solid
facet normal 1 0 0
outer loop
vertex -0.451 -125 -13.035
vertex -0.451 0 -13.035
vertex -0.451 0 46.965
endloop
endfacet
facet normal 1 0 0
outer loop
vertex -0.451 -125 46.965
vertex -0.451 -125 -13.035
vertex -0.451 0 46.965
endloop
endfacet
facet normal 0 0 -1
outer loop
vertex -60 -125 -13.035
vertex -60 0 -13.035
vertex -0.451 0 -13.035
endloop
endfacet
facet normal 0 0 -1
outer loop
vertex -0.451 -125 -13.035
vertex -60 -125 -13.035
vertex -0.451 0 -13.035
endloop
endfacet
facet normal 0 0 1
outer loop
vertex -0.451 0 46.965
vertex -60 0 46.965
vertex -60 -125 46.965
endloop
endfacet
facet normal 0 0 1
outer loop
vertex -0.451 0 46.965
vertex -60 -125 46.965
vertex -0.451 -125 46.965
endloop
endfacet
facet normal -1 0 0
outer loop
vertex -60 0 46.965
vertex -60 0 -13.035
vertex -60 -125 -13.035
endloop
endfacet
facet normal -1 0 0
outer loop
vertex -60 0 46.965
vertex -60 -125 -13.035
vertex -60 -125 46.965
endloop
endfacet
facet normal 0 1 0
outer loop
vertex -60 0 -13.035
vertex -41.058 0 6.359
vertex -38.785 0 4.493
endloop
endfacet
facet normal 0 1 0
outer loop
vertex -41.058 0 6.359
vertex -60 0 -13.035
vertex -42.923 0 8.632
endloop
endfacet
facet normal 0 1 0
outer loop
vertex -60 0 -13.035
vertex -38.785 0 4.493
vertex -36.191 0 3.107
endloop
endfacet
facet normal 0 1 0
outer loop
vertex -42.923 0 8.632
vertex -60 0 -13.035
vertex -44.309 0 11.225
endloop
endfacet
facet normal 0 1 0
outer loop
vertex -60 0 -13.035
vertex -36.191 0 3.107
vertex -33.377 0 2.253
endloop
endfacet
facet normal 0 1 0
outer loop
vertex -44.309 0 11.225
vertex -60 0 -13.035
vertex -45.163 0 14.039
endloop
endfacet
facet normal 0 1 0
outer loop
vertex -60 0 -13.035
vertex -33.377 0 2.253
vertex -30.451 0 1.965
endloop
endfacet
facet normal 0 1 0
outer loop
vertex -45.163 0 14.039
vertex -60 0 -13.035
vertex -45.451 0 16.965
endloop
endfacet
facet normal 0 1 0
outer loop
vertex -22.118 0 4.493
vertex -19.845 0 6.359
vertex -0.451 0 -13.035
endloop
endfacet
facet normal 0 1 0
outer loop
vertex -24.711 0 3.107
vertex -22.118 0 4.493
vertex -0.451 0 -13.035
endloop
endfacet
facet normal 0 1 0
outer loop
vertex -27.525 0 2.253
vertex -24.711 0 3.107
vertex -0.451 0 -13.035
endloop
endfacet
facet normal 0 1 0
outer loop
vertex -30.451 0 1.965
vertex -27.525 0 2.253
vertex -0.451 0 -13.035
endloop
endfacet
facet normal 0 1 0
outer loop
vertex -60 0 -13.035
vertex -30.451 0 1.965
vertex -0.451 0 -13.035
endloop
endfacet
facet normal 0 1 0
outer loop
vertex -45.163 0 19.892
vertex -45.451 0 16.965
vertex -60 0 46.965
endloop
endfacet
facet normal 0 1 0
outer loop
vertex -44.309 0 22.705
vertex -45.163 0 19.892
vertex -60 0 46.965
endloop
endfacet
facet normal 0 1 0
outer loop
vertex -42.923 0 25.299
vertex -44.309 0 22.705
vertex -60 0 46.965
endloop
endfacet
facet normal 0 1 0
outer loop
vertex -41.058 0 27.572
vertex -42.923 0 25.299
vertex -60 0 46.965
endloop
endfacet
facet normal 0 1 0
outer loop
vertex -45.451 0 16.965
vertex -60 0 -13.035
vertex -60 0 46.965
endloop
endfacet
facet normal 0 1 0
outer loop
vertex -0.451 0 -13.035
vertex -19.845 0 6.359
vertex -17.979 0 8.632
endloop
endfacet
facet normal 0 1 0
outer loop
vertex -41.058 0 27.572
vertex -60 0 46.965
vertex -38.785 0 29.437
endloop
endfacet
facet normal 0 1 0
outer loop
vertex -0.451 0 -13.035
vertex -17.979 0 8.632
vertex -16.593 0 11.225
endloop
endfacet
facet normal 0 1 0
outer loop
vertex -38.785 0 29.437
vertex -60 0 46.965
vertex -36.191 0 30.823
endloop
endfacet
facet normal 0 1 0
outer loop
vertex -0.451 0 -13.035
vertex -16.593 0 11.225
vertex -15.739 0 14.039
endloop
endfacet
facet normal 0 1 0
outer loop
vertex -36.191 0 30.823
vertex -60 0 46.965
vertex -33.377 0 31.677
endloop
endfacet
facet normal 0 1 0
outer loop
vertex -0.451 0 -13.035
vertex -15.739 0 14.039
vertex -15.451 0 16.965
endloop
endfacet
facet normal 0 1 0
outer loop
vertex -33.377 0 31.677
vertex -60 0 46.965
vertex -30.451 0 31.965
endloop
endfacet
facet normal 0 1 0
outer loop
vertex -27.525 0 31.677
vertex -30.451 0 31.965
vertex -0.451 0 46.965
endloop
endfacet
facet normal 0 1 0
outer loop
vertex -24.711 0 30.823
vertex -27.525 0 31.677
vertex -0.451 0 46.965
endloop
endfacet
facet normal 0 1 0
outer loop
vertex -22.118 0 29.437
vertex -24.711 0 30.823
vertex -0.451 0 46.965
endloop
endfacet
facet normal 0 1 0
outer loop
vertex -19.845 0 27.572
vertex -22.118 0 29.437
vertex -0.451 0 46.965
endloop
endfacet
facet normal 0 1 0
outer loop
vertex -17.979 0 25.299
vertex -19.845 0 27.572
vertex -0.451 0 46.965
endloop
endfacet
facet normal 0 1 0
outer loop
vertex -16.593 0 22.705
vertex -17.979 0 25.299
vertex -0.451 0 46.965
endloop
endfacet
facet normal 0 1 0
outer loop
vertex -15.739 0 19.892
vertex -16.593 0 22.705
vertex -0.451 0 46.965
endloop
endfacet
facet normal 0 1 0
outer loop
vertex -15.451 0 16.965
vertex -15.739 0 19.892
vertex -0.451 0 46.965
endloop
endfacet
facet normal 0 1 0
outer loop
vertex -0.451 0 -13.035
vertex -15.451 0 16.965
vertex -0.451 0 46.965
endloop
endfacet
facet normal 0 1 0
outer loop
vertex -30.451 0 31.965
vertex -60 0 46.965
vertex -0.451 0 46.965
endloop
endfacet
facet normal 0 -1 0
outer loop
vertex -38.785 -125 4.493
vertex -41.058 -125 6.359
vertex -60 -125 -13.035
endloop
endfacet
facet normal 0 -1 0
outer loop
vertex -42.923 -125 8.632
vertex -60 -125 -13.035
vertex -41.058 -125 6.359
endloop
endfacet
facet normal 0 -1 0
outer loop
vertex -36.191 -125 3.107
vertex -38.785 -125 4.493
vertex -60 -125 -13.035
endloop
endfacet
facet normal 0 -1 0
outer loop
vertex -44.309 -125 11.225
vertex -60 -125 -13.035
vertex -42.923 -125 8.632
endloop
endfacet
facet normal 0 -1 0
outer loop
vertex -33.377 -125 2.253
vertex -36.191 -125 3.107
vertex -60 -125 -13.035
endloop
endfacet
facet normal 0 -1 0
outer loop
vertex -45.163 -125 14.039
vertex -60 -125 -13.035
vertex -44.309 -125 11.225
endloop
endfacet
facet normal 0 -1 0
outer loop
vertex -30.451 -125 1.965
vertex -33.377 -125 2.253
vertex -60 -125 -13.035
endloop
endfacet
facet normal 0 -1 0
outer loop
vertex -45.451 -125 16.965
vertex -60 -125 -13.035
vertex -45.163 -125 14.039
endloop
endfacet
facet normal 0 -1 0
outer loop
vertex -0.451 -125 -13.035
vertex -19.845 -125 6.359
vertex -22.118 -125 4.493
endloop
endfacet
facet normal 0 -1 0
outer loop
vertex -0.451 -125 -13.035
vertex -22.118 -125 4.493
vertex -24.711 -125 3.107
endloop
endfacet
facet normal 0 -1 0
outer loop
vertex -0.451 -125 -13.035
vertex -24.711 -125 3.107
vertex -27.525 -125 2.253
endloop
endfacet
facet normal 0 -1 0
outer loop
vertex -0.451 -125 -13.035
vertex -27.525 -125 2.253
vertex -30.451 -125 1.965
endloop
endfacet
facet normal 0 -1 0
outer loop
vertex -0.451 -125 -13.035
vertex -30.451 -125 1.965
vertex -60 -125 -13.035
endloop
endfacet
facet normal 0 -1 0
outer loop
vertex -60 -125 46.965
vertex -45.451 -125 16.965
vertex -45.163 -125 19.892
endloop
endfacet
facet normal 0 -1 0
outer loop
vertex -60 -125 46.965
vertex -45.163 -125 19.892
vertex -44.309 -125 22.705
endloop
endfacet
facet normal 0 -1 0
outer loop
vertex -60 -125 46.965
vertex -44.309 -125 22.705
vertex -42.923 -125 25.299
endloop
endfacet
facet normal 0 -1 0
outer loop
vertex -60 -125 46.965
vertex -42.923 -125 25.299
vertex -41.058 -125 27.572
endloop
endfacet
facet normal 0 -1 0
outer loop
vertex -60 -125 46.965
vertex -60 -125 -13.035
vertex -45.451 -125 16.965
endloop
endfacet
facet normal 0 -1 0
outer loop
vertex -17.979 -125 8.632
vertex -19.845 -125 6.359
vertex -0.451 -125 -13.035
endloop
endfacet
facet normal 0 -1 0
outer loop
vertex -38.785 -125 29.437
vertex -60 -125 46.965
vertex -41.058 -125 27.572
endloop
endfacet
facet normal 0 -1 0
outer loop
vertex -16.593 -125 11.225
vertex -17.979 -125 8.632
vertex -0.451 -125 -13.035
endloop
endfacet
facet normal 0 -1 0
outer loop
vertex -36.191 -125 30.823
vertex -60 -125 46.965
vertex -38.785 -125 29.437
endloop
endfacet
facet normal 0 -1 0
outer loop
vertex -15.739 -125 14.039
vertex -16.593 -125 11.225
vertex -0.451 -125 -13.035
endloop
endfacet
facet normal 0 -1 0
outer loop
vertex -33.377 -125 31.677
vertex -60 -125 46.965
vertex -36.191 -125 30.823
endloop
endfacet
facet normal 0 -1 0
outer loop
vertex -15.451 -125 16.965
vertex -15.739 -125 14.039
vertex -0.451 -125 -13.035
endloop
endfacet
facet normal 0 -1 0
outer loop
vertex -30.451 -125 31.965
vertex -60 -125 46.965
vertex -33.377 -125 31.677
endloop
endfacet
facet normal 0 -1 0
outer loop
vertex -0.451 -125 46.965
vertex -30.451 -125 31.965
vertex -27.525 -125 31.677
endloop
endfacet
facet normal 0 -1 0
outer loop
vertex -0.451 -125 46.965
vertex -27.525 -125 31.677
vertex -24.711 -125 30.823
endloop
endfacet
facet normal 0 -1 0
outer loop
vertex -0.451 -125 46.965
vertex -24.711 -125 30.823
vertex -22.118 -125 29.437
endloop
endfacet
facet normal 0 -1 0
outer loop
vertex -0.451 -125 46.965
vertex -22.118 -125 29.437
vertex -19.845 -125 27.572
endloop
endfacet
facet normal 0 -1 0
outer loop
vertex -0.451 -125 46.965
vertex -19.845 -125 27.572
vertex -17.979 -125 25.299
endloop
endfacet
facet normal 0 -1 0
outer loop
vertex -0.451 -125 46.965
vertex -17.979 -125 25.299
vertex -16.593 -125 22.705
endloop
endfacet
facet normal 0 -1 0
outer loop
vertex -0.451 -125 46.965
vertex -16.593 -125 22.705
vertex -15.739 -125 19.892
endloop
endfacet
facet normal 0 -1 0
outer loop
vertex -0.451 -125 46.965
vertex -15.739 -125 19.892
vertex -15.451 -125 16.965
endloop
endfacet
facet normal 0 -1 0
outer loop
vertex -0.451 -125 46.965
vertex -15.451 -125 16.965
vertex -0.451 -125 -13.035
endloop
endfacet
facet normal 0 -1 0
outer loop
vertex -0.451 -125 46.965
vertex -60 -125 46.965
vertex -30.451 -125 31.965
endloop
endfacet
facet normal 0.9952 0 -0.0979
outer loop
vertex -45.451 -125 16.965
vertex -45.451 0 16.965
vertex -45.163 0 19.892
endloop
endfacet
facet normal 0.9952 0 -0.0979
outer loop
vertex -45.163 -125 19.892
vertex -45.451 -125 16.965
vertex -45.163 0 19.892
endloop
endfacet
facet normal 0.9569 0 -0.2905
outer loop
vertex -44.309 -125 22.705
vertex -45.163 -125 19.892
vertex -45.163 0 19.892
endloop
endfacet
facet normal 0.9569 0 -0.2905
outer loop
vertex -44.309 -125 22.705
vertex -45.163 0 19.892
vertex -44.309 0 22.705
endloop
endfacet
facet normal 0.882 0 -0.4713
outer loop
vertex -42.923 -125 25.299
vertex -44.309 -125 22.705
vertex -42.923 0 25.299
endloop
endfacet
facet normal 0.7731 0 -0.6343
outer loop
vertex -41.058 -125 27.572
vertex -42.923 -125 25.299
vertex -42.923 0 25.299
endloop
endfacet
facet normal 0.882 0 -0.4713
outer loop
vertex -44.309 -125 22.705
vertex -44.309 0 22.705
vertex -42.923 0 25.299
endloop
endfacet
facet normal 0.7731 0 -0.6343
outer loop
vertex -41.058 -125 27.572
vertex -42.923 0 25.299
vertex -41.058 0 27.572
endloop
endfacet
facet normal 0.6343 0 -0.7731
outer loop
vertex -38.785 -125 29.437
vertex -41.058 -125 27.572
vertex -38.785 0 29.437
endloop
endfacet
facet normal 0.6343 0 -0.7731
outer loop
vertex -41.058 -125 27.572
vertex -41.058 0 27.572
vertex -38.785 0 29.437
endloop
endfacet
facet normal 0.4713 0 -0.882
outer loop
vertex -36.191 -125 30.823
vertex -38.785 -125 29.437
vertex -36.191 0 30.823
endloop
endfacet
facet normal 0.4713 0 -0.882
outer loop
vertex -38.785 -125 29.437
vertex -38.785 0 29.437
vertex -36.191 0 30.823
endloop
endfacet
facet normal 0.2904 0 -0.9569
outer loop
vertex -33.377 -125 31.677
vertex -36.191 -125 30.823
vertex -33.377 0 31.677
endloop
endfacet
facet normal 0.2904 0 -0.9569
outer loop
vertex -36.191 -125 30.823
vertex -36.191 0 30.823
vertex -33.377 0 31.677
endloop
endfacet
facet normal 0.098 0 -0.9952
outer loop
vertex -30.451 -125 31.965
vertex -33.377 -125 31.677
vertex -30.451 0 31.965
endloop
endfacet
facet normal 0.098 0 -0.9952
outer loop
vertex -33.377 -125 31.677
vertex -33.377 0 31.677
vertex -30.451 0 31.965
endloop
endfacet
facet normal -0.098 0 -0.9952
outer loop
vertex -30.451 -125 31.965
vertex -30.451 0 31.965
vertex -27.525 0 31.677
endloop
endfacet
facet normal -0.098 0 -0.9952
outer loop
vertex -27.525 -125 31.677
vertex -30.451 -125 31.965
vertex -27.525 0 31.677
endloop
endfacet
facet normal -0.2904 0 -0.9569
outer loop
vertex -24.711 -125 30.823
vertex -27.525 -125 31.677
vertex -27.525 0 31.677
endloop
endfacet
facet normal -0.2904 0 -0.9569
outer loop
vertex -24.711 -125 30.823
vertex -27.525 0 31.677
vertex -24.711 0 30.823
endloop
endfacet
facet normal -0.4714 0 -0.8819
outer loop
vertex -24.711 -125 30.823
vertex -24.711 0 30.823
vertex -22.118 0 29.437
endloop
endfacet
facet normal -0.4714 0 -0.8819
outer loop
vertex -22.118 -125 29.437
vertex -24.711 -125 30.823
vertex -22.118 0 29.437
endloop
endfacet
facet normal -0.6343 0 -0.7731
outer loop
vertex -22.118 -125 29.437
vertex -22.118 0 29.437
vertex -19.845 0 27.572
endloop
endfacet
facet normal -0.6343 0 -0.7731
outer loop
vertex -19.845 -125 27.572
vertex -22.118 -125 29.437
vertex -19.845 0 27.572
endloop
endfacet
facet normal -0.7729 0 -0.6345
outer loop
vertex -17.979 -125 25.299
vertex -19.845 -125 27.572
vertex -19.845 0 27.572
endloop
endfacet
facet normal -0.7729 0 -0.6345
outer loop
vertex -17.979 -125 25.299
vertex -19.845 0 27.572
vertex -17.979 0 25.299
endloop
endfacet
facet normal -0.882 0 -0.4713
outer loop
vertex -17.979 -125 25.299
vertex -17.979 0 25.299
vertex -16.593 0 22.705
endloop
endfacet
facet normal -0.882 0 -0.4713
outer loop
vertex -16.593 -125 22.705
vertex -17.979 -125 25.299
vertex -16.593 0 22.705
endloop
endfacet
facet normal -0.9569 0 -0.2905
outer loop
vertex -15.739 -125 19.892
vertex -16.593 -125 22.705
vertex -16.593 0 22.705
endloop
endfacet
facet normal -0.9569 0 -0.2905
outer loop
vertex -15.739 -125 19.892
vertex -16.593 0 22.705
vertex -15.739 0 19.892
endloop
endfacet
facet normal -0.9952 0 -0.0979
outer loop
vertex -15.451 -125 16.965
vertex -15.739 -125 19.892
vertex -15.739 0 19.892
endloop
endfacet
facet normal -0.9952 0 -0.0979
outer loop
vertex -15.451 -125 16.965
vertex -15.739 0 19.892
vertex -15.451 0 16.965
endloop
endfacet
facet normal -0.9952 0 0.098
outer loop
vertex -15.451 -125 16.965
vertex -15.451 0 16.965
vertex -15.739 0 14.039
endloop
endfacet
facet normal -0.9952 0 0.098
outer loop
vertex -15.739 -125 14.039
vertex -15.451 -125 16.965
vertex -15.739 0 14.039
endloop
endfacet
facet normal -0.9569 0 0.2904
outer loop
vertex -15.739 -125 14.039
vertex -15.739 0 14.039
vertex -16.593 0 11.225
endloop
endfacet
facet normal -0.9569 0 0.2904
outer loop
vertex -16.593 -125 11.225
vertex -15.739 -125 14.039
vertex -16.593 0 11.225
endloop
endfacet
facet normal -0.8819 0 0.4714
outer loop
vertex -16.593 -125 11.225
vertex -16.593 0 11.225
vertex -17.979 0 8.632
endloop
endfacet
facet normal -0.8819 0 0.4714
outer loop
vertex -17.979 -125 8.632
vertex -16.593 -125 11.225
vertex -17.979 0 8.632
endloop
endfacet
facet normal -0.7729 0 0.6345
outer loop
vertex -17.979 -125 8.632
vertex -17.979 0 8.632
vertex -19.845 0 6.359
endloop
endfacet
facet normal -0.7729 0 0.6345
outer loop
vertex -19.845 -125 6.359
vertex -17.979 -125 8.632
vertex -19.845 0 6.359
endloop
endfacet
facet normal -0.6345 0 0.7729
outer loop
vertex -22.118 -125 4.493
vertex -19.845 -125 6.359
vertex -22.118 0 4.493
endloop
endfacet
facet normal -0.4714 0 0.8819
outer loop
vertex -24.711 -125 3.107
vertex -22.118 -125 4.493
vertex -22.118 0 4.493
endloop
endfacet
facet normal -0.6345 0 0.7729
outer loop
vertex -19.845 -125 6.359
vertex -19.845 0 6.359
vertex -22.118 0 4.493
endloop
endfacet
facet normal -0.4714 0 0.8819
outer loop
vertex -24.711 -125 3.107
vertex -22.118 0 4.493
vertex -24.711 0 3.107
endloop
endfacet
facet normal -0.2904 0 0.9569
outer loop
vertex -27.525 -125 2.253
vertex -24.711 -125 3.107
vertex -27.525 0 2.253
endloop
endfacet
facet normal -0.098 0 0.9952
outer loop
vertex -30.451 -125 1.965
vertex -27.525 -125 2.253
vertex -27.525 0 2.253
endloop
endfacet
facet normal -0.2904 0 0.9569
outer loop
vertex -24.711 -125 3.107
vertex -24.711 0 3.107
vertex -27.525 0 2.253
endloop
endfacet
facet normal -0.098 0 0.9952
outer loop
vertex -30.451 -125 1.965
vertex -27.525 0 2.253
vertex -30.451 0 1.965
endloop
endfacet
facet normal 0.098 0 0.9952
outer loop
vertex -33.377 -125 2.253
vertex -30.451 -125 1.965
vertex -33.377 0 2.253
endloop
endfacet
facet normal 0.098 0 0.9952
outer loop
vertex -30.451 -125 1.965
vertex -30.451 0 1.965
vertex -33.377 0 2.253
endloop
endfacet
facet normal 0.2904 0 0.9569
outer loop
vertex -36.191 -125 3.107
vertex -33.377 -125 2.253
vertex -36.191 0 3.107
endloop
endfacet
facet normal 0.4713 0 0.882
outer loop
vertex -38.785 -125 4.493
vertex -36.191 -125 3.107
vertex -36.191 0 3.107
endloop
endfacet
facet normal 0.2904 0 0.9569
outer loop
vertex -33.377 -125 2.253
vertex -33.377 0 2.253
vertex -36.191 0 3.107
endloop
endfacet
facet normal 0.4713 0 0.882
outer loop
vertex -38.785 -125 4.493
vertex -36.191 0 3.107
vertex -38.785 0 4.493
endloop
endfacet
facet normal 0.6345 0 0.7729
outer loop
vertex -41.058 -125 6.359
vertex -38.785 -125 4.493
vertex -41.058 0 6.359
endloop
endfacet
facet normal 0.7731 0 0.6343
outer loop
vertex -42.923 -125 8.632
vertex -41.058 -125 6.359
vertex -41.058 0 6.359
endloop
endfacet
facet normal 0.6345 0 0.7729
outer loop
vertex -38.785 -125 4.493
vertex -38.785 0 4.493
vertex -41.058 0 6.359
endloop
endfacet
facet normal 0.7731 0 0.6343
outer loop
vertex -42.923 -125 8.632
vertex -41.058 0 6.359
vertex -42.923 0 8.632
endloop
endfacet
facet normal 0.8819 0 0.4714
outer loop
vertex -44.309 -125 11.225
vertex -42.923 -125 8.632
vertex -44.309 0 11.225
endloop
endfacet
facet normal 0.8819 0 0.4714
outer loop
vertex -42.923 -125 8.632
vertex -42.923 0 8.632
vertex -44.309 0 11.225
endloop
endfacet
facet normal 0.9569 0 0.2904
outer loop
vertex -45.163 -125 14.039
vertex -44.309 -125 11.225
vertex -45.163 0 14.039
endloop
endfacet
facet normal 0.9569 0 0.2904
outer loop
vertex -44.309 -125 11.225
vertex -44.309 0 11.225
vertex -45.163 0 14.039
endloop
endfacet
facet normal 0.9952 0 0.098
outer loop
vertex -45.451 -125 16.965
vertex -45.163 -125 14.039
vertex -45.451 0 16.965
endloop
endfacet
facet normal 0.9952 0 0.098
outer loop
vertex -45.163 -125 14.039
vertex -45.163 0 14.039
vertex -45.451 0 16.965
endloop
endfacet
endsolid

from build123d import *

# Parameters (mm, degrees)
F0_W       = 59.5488740506
F0_H       = 60
F0_R       = 15
F1_DEPTH   = 125
F2_R       = 15
F1_FACE1_W = 59.5488740506
F1_FACE1_H = 60
F3_DEPTH   = 125.001


with BuildPart() as f1:
    # F0 (on Front) → F1 (new body)
    with BuildSketch(Plane.XZ):
        with Locations((-30.2255629747, 16.9652015452)):
            Rectangle(F0_W, F0_H)
        with Locations((-30.4511259494, 16.9652015452)):
            Circle(F0_R, mode=Mode.SUBTRACT)
        with Locations((-30.4511259494, 16.9652015452)):
            Circle(F0_R)
    extrude(amount=F1_DEPTH)

    # F2 (on face) + F1_face1 (on face) → F3 (cut, through all)
    with BuildSketch(Plane(origin=(0, 0, 0), x_dir=(-1, 0, 0), z_dir=(0, 1, 0))):
        with Locations((30.4511259494, 16.9652015452)):
            Circle(F2_R)
    with BuildSketch(Plane(origin=(-30.2255629747, -125, 16.9652015452), x_dir=(1, 0, 0), z_dir=(0, -1, 0))):
        Rectangle(F1_FACE1_W, F1_FACE1_H)
    extrude(amount=-F3_DEPTH, dir=(0, 1, 0), mode=Mode.SUBTRACT)


solid = f1.part
